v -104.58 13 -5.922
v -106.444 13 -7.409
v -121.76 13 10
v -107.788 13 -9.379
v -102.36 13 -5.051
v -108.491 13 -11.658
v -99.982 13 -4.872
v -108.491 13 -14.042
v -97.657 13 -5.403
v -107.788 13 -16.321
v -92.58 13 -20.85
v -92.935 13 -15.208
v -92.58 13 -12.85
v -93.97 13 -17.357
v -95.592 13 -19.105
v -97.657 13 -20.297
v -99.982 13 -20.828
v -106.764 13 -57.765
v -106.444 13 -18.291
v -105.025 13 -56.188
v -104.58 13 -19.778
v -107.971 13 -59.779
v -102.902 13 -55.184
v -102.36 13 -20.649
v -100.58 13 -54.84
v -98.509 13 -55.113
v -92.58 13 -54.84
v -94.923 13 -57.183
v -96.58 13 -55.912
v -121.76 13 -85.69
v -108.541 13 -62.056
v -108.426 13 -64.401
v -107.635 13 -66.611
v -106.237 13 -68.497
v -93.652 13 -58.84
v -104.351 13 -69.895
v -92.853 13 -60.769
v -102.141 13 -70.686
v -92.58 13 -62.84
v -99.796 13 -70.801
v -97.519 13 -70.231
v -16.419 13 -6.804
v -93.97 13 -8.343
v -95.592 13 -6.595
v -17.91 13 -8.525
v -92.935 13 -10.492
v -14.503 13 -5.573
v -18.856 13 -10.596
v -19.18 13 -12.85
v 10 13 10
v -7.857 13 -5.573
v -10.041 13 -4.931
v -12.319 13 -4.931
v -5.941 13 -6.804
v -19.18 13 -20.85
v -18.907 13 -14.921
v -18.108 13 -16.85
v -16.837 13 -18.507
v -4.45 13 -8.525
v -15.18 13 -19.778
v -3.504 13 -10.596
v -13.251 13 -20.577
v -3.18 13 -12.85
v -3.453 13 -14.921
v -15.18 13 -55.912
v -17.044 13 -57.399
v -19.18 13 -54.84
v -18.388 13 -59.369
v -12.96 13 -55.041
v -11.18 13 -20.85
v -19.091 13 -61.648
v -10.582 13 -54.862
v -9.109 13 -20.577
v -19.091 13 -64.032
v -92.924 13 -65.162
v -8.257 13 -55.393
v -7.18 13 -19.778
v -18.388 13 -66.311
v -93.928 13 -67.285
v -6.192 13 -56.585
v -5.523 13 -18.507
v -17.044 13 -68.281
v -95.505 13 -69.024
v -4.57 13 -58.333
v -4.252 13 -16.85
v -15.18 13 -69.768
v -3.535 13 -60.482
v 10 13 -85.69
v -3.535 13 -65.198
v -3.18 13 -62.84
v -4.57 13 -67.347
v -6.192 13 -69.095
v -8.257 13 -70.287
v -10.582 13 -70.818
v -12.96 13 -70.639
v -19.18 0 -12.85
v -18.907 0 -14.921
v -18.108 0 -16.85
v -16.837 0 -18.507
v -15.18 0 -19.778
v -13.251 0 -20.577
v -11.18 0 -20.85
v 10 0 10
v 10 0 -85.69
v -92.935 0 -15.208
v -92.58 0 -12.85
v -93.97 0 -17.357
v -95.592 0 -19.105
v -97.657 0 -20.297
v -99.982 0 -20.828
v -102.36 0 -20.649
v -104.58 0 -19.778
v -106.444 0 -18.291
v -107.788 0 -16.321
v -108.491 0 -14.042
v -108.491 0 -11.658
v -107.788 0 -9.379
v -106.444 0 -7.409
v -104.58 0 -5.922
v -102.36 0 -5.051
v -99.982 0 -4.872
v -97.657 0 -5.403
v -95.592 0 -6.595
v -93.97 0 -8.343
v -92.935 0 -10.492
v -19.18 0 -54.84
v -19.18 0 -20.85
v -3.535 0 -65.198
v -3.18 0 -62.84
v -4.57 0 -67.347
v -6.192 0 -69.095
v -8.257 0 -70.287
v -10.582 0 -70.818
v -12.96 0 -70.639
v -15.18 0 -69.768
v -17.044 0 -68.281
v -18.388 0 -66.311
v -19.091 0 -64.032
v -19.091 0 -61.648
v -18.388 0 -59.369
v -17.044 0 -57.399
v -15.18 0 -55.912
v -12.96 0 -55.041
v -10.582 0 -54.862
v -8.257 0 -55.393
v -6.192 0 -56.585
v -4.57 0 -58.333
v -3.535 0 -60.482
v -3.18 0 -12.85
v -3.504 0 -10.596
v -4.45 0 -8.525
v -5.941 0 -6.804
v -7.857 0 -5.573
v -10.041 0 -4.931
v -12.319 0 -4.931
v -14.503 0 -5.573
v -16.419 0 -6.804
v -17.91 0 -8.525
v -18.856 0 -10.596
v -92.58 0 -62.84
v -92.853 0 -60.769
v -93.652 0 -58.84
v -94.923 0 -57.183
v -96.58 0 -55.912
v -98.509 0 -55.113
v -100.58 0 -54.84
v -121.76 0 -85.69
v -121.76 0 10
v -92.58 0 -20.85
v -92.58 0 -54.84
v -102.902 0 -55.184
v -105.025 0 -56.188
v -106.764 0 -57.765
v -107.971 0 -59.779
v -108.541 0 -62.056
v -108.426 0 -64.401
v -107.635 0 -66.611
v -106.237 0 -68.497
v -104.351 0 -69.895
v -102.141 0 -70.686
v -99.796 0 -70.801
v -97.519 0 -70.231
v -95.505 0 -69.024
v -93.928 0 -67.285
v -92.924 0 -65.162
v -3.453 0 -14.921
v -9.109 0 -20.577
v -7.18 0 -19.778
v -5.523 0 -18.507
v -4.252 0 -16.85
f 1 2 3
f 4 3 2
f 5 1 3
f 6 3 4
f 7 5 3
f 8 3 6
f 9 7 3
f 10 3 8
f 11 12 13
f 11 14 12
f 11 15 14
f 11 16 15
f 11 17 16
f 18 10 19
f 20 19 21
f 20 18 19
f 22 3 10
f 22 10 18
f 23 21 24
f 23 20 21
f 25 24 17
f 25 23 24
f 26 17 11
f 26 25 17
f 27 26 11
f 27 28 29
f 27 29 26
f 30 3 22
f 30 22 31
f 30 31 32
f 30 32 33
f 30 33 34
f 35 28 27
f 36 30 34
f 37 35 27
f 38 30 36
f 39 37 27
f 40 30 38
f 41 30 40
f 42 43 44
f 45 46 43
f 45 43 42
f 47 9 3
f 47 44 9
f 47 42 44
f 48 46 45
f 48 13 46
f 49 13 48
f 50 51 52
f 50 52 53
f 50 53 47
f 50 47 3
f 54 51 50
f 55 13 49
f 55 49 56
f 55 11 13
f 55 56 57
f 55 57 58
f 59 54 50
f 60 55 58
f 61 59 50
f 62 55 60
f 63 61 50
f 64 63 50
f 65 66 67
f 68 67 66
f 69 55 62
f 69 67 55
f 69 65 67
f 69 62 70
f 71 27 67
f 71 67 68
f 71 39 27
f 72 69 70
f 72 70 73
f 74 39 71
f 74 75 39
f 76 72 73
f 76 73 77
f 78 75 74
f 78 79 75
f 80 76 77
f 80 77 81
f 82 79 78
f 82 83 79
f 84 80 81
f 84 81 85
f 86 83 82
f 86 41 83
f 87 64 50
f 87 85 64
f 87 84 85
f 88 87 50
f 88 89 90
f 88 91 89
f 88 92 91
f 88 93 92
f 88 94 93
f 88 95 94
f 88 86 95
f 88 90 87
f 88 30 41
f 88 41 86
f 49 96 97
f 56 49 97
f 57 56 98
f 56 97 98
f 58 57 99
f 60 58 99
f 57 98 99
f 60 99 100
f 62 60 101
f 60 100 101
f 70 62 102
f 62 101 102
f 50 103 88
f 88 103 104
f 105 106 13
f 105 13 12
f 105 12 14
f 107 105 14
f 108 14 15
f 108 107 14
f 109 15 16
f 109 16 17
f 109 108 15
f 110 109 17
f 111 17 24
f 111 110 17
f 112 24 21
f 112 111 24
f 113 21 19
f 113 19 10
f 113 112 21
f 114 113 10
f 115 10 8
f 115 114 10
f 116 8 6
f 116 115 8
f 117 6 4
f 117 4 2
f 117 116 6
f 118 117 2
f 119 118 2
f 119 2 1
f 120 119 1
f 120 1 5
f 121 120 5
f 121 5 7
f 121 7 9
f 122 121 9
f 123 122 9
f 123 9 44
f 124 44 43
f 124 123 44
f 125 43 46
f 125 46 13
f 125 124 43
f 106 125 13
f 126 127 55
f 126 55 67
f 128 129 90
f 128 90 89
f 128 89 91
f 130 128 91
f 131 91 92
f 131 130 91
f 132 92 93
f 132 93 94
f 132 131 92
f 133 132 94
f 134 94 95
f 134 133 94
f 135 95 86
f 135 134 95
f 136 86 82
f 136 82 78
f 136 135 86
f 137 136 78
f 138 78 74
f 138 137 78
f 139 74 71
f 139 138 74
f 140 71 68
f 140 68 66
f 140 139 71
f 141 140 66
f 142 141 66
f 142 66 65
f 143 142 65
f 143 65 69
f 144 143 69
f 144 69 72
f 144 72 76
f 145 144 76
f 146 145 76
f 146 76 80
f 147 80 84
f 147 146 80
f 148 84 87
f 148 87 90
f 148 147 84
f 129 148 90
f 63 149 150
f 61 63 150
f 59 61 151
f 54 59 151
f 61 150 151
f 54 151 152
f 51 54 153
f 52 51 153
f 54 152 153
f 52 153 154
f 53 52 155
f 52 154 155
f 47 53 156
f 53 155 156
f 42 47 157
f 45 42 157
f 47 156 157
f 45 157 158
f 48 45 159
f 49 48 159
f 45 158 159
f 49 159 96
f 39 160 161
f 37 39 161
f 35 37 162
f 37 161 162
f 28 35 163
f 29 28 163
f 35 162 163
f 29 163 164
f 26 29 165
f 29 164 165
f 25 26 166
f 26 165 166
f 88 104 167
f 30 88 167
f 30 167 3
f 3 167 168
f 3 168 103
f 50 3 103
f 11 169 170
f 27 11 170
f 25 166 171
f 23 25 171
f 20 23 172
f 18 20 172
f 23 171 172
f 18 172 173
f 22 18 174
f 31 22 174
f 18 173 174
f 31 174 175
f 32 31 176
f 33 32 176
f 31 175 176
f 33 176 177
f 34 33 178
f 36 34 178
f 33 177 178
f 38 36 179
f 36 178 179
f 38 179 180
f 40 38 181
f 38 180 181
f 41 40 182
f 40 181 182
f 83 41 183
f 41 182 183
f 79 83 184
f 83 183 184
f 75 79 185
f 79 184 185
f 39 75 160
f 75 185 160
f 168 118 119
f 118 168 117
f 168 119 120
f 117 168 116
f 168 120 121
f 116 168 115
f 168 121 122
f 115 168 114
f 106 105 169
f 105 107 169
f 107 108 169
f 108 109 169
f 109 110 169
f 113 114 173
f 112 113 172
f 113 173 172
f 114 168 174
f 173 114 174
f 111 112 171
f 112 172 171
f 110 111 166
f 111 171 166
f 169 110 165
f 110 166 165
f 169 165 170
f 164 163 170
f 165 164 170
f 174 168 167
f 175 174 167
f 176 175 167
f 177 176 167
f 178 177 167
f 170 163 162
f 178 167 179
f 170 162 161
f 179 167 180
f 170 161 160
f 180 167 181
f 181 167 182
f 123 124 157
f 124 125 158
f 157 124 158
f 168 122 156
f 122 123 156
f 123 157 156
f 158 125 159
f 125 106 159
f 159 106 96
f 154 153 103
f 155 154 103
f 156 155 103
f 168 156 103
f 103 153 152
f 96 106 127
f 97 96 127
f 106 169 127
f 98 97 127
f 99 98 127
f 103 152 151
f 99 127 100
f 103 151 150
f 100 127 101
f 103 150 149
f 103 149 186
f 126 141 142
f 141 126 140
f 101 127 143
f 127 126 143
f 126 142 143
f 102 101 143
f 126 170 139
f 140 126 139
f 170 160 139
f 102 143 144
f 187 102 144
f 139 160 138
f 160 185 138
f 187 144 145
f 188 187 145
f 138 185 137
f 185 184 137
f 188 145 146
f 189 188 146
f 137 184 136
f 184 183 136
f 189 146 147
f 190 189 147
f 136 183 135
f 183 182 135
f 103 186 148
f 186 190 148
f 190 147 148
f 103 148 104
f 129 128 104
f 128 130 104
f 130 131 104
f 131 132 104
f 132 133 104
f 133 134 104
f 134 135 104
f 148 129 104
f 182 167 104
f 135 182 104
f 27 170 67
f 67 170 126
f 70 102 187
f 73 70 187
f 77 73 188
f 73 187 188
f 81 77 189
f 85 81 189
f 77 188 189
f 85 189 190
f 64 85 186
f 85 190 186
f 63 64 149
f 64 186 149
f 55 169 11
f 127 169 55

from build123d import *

# Parameters (mm, degrees)
SKETCH3_R           = 8
SKETCH3_W           = 73.4
SKETCH3_H           = 33.99
BOSS_EXTRUDE1_DEPTH = 13


with BuildPart() as part:
    # Sketch3 → Boss-Extrude1 (new body)
    with BuildSketch(Plane(origin=(0, 0, 0), x_dir=(1, 0, 0), z_dir=(0, 1, 0))):
        Polygon((-121.76, 12.85), (-121.76, -10), (-108.58, -10), (-11.18, -10), (-3.18, -10), (10, -10), (10, 62.84), (10, 85.69), (-3.18, 85.69), (-11.18, 85.69), (-108.58, 85.69), (-121.76, 85.69), (-121.76, 62.84), align=None)
        with Locations((-100.58, 12.85)):
            Circle(SKETCH3_R, mode=Mode.SUBTRACT)
        with BuildLine():
            Line((-19.18, 12.85), (-19.18, 20.85))
            Line((-19.18, 20.85), (-11.18, 20.85))
            ThreePointArc((-11.18, 20.85), (-5.523145751, 18.506854249), (-3.18, 12.85))
            ThreePointArc((-3.18, 12.85), (-11.18, 4.85), (-19.18, 12.85))
        make_face(mode=Mode.SUBTRACT)
        with BuildLine():
            Line((-92.58, 54.84), (-100.58, 54.84))
            ThreePointArc((-100.58, 54.84), (-106.236854249, 68.496854249), (-92.58, 62.84))
            Line((-92.58, 62.84), (-92.58, 54.84))
        make_face(mode=Mode.SUBTRACT)
        with Locations((-55.88, 37.845)):
            Rectangle(SKETCH3_W, SKETCH3_H, mode=Mode.SUBTRACT)
        with Locations((-11.18, 62.84)):
            Circle(SKETCH3_R, mode=Mode.SUBTRACT)
        with BuildLine():
            ThreePointArc((-92.58, 62.84), (-94.923145751, 57.183145751), (-100.58, 54.84))
            Line((-100.58, 54.84), (-92.58, 54.84))
            Line((-92.58, 54.84), (-92.58, 62.84))
        make_face()
        with BuildLine():
            Line((-11.18, 20.85), (-19.18, 20.85))
            Line((-19.18, 20.85), (-19.18, 12.85))
            ThreePointArc((-19.18, 12.85), (-16.836854249, 18.506854249), (-11.18, 20.85))
        make_face()
    extrude(amount=BOSS_EXTRUDE1_DEPTH)


solid = part.part
